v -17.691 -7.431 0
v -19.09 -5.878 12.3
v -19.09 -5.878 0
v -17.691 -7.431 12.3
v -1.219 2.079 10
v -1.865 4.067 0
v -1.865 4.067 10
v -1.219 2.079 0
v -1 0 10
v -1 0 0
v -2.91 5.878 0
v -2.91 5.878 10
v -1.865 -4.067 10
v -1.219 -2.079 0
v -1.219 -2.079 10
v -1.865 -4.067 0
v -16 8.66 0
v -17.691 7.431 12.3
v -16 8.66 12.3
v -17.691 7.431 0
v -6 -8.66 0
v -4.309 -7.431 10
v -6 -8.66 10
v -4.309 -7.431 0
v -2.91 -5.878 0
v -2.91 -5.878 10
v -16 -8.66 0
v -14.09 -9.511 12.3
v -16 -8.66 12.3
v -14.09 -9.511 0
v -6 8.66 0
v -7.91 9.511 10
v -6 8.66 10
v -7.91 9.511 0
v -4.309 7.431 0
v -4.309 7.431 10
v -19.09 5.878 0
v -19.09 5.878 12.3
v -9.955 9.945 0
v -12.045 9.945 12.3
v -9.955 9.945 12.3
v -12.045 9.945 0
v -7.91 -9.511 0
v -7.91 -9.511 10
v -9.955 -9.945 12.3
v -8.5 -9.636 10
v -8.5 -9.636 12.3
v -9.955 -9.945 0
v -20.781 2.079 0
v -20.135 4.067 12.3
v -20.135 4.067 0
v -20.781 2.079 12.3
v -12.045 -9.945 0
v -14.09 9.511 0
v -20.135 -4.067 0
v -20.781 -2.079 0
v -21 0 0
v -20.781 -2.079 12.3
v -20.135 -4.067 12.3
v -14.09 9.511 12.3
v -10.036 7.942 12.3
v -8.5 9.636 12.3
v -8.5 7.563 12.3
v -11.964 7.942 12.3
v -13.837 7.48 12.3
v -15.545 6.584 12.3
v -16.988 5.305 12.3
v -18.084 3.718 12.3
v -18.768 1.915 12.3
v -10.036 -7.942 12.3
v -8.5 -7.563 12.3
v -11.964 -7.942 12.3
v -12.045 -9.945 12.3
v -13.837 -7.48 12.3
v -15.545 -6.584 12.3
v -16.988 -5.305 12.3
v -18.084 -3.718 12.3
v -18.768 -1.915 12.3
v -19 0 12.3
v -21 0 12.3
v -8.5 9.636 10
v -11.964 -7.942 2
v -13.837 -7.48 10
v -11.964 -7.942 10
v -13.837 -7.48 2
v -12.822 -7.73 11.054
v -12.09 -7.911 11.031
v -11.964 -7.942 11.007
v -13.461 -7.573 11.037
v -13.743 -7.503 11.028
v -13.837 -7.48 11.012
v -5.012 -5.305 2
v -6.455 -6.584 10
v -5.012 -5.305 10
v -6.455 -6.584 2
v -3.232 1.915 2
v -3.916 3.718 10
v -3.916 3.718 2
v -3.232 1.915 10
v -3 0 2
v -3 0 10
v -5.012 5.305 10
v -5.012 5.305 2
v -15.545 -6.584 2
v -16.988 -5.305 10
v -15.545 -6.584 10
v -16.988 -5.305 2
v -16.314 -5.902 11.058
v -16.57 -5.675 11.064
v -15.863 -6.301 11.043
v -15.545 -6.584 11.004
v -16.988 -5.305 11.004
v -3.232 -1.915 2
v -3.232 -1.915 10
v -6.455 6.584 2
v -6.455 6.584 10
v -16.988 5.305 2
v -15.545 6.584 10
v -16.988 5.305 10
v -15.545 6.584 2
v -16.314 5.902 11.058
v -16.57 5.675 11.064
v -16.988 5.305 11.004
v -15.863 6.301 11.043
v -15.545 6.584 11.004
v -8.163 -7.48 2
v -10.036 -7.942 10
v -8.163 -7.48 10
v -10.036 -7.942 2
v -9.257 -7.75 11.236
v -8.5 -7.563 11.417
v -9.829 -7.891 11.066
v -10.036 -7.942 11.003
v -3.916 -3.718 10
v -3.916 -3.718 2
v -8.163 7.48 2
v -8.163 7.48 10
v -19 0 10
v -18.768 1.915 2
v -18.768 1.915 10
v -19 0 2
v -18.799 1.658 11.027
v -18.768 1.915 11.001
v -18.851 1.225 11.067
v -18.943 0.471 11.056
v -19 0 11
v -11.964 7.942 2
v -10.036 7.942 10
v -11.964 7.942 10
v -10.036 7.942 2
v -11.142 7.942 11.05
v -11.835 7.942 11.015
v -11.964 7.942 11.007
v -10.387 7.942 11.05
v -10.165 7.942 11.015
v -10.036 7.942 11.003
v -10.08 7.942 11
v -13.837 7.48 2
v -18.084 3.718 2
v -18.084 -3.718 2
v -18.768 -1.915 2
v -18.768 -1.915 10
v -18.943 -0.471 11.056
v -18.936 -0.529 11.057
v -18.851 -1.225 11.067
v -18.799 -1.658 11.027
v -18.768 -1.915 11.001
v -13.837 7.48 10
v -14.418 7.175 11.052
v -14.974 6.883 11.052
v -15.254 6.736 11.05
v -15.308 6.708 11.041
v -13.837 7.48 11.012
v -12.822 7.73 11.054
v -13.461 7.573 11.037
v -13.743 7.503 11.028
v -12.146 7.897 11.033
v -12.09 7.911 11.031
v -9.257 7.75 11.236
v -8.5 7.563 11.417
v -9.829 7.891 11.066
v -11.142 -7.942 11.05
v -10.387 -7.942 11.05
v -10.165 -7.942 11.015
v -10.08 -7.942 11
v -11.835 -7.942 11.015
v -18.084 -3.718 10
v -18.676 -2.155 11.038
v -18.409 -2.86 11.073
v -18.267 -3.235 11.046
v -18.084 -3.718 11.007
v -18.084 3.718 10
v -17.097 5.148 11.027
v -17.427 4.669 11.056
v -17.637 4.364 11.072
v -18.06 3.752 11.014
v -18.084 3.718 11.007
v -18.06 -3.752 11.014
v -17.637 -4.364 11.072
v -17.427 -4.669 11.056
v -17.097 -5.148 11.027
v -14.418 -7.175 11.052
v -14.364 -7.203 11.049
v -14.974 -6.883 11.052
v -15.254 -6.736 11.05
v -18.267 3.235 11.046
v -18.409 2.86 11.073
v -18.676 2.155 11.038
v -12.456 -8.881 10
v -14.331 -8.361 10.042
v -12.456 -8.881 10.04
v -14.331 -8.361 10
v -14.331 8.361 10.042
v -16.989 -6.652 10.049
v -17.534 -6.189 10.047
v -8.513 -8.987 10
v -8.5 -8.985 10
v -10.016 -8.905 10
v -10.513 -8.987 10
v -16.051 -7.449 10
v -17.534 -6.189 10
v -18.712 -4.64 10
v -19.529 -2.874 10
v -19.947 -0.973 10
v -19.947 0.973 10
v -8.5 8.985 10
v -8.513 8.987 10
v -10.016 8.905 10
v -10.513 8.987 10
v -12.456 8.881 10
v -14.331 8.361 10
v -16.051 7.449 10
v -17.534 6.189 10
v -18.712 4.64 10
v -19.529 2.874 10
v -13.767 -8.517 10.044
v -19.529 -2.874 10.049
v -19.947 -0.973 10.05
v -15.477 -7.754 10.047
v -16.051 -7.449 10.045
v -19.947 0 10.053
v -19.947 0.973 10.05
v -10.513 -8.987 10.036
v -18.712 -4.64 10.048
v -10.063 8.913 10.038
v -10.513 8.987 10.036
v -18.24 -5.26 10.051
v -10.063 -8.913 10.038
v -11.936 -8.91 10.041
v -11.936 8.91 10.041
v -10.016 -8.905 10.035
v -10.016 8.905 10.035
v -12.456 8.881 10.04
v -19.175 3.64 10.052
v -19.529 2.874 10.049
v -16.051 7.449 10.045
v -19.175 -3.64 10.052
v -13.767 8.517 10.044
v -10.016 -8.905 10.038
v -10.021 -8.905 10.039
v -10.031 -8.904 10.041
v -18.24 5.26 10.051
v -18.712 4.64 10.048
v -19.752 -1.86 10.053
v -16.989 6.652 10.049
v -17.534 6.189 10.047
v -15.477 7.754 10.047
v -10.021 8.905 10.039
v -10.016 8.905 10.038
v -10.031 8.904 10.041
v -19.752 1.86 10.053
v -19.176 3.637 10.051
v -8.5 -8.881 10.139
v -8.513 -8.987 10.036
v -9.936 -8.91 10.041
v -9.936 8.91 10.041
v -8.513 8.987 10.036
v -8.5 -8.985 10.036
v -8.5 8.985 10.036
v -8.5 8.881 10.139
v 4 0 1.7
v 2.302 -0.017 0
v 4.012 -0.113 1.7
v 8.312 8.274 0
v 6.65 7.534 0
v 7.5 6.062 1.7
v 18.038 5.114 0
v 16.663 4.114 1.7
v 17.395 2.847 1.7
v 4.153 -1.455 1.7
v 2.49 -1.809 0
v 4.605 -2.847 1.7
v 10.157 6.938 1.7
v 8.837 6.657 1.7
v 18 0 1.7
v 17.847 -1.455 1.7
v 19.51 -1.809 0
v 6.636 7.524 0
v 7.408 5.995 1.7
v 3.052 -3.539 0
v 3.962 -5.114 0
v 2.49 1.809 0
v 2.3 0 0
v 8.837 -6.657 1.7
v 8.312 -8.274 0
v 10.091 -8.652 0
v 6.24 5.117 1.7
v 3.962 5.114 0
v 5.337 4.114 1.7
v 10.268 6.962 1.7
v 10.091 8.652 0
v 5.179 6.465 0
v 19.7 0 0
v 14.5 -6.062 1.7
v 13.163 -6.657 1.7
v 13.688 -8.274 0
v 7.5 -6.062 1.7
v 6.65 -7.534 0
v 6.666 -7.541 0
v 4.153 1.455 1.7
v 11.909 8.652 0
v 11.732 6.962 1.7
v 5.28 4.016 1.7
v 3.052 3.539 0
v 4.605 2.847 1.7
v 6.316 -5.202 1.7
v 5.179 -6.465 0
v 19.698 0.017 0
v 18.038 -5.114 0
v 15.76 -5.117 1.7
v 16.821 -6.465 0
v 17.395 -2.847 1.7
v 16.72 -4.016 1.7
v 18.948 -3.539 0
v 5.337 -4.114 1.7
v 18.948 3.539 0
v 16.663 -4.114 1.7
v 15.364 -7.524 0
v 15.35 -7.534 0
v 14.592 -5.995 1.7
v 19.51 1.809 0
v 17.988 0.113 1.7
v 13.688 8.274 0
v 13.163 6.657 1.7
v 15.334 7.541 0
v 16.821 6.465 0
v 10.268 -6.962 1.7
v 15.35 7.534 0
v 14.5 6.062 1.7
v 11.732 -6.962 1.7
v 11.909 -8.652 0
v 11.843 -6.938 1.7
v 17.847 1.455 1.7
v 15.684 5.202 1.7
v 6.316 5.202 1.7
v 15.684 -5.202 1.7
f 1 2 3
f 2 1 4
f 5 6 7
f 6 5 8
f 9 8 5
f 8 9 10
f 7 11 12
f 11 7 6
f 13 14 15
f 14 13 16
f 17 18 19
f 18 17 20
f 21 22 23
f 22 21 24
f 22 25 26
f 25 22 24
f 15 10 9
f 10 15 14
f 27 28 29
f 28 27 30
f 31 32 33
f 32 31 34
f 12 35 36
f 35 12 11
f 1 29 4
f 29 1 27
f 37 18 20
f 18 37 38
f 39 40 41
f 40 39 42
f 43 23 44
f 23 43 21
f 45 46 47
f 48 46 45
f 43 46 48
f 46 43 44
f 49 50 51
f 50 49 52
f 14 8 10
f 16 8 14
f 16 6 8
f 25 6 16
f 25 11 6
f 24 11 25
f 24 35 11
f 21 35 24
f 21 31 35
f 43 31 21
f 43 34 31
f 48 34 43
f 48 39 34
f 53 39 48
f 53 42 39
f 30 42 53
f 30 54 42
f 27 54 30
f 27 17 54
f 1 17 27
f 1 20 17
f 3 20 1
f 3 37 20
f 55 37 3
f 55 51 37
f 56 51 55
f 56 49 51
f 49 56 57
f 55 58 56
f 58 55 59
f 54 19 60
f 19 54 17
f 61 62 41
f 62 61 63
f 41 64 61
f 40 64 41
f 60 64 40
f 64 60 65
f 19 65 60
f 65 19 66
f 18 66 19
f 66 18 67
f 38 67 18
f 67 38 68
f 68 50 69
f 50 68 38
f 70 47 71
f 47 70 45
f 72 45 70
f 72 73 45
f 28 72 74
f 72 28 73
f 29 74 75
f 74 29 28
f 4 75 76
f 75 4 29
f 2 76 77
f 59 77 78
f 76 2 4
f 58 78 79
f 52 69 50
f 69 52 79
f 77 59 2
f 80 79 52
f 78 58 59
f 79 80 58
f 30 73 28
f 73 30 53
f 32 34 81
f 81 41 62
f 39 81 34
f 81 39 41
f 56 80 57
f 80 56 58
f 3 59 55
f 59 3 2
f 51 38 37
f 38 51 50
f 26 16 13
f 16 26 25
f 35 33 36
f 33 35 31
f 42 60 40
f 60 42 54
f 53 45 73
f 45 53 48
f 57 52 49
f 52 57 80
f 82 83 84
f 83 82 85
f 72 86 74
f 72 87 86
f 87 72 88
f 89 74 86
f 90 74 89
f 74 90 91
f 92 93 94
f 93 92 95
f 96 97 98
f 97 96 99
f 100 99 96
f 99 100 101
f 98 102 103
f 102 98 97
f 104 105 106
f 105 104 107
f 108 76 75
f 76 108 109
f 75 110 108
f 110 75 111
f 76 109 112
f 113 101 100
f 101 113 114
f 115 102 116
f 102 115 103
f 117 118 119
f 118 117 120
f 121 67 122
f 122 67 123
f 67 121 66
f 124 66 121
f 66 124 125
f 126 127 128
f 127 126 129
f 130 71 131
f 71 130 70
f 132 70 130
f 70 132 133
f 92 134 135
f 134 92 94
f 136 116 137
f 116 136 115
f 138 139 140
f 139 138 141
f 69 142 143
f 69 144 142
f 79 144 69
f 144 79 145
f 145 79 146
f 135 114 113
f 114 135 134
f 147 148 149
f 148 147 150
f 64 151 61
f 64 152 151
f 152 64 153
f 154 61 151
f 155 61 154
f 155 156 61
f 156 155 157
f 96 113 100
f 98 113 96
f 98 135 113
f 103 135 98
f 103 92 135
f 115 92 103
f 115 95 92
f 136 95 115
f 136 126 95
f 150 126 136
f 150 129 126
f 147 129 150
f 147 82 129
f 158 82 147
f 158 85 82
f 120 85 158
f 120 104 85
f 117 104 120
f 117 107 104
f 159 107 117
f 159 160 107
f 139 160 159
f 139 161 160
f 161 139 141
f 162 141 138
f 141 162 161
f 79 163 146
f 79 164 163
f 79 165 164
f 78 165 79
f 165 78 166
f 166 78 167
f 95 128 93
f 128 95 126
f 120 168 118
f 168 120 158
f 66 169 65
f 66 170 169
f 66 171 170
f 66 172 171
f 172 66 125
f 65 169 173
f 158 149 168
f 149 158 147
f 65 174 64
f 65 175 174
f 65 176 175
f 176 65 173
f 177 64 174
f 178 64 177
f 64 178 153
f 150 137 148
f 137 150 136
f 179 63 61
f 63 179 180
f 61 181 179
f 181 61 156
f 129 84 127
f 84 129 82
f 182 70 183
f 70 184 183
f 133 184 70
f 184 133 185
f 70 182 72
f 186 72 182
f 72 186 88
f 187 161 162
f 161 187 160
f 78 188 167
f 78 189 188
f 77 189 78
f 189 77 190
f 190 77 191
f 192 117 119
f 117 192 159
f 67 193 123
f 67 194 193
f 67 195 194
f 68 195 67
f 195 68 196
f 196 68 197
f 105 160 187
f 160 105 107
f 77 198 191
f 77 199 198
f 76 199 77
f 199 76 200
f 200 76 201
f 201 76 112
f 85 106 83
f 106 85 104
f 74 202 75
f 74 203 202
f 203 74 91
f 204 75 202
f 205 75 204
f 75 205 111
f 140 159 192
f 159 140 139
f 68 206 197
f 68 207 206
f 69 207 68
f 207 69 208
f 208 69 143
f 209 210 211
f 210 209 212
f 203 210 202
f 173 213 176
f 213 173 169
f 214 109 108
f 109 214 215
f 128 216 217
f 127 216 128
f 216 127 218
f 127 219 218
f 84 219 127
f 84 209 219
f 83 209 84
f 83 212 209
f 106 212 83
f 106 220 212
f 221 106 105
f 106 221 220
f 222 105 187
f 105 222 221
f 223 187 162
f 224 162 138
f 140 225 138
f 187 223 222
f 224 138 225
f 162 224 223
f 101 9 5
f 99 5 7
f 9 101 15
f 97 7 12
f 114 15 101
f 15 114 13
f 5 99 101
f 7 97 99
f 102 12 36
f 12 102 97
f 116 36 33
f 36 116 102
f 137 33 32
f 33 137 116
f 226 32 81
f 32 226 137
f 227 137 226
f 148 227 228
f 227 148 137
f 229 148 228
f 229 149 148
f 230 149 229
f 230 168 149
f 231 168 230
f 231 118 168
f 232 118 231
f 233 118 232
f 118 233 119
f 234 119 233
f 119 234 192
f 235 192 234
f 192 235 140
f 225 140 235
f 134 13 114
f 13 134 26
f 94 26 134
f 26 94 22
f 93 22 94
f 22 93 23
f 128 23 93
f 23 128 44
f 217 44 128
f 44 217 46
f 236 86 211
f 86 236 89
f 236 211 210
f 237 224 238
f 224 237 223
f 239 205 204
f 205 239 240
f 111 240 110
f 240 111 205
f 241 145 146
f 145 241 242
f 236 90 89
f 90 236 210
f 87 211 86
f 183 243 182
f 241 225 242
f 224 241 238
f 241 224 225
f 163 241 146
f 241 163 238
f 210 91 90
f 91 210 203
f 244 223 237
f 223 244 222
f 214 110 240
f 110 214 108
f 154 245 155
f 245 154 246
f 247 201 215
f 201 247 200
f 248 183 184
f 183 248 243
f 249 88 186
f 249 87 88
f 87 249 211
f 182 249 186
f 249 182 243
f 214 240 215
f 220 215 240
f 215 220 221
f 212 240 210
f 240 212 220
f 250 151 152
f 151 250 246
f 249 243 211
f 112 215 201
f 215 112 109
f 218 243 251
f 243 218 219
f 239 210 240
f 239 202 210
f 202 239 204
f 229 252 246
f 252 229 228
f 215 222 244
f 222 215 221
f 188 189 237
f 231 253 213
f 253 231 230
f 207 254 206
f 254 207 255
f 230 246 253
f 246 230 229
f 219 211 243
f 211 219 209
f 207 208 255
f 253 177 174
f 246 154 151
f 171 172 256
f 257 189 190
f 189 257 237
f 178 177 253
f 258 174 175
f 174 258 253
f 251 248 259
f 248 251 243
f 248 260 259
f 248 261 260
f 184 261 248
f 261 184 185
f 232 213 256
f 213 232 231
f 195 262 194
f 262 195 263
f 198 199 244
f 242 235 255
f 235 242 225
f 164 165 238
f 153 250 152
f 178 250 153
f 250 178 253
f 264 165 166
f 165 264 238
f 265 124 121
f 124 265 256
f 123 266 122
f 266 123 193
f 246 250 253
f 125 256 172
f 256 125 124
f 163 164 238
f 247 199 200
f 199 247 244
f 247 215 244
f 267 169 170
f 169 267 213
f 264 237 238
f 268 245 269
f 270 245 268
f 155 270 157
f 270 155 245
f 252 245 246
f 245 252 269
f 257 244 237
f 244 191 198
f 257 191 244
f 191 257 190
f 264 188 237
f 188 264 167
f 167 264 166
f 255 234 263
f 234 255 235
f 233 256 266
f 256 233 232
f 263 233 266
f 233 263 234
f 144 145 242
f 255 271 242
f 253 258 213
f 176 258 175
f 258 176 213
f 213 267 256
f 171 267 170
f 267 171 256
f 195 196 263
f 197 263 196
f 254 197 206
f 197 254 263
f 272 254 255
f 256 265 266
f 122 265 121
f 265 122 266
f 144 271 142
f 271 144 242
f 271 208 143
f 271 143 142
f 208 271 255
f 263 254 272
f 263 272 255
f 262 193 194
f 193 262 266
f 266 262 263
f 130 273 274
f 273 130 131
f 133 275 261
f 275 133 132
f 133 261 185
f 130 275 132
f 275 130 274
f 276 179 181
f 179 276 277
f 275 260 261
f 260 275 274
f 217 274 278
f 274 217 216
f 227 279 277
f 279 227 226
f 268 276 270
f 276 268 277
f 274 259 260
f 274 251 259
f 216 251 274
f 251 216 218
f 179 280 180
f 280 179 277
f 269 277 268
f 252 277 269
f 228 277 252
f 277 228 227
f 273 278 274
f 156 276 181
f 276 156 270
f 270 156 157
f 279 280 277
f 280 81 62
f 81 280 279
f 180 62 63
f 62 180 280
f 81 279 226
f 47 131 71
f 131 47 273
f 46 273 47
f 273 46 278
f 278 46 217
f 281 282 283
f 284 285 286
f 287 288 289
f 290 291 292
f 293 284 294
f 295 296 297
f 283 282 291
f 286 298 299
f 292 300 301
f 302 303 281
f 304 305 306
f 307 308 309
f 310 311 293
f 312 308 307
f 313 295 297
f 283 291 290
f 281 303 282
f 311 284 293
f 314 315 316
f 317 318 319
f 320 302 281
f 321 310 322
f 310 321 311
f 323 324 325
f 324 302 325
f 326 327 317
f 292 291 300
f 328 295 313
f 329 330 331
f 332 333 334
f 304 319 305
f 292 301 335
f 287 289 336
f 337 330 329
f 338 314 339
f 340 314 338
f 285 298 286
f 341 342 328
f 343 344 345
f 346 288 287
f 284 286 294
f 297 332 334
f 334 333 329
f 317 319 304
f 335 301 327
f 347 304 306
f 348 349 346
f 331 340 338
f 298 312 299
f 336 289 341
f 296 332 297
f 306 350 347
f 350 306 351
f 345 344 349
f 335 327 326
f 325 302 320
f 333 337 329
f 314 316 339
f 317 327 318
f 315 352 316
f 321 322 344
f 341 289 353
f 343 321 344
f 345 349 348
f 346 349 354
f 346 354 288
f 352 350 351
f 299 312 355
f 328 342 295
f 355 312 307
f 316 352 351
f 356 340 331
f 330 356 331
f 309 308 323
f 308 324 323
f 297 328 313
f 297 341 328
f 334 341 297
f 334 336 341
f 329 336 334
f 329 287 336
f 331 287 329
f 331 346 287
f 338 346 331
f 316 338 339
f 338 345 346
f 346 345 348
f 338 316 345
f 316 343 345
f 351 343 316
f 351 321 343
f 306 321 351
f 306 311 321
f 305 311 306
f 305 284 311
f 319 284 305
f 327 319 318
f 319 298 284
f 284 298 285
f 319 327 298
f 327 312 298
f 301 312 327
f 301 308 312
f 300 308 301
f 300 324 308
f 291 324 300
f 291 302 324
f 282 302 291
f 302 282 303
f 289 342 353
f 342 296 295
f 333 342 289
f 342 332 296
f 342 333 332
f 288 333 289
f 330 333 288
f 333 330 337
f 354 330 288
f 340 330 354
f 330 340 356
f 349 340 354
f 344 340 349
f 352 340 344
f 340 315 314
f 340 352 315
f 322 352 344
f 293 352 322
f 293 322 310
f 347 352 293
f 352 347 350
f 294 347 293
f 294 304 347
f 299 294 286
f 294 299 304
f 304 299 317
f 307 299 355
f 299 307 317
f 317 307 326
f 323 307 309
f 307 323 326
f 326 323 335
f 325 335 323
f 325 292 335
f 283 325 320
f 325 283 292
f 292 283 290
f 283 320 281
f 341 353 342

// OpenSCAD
//Author: Devin Grady
//License: CC BY 3.0 US ( http://creativecommons.org/licenses/by/3.0/us/ )

//Inner radius (open space in interior)
radius = 10; 

//Inner height (open space in interior)
height = 10; 

//Maximum wall thickness; will be cut into to fit lid.
wall = 2; 

//Fit tolerance parameter.
tolerance = .3; 

module cylinder_box(r=radius, h=height, w=wall, tol=tolerance){
	difference(){
		cylinder(r=r,h=h+w+tol);
		translate([0,0,w])cylinder(r=r-w, h = h+w+2*tol);
		translate([0,0,h])cylinder_lid(r=r,w=w, tol = 0);
		translate([w,0,h])cylinder_lid(r=r,w=w, tol = 0);
		translate([r/4, -r, h])cube([2*r, 2*r, r]);
	}
}
module cylinder_lid(r=radius, w=wall, tol = tolerance){
	hull(){difference(){
		cylinder(r=r-w/2, h=w-tol);
		translate([0,0,-tol])rotate_extrude()translate([r-w/2,0,0])rotate([0,0,45])square(r);
	}}
}


translate([-1.1*radius,0,0])cylinder_box();
translate([1.1*radius,0,0])cylinder_lid();
